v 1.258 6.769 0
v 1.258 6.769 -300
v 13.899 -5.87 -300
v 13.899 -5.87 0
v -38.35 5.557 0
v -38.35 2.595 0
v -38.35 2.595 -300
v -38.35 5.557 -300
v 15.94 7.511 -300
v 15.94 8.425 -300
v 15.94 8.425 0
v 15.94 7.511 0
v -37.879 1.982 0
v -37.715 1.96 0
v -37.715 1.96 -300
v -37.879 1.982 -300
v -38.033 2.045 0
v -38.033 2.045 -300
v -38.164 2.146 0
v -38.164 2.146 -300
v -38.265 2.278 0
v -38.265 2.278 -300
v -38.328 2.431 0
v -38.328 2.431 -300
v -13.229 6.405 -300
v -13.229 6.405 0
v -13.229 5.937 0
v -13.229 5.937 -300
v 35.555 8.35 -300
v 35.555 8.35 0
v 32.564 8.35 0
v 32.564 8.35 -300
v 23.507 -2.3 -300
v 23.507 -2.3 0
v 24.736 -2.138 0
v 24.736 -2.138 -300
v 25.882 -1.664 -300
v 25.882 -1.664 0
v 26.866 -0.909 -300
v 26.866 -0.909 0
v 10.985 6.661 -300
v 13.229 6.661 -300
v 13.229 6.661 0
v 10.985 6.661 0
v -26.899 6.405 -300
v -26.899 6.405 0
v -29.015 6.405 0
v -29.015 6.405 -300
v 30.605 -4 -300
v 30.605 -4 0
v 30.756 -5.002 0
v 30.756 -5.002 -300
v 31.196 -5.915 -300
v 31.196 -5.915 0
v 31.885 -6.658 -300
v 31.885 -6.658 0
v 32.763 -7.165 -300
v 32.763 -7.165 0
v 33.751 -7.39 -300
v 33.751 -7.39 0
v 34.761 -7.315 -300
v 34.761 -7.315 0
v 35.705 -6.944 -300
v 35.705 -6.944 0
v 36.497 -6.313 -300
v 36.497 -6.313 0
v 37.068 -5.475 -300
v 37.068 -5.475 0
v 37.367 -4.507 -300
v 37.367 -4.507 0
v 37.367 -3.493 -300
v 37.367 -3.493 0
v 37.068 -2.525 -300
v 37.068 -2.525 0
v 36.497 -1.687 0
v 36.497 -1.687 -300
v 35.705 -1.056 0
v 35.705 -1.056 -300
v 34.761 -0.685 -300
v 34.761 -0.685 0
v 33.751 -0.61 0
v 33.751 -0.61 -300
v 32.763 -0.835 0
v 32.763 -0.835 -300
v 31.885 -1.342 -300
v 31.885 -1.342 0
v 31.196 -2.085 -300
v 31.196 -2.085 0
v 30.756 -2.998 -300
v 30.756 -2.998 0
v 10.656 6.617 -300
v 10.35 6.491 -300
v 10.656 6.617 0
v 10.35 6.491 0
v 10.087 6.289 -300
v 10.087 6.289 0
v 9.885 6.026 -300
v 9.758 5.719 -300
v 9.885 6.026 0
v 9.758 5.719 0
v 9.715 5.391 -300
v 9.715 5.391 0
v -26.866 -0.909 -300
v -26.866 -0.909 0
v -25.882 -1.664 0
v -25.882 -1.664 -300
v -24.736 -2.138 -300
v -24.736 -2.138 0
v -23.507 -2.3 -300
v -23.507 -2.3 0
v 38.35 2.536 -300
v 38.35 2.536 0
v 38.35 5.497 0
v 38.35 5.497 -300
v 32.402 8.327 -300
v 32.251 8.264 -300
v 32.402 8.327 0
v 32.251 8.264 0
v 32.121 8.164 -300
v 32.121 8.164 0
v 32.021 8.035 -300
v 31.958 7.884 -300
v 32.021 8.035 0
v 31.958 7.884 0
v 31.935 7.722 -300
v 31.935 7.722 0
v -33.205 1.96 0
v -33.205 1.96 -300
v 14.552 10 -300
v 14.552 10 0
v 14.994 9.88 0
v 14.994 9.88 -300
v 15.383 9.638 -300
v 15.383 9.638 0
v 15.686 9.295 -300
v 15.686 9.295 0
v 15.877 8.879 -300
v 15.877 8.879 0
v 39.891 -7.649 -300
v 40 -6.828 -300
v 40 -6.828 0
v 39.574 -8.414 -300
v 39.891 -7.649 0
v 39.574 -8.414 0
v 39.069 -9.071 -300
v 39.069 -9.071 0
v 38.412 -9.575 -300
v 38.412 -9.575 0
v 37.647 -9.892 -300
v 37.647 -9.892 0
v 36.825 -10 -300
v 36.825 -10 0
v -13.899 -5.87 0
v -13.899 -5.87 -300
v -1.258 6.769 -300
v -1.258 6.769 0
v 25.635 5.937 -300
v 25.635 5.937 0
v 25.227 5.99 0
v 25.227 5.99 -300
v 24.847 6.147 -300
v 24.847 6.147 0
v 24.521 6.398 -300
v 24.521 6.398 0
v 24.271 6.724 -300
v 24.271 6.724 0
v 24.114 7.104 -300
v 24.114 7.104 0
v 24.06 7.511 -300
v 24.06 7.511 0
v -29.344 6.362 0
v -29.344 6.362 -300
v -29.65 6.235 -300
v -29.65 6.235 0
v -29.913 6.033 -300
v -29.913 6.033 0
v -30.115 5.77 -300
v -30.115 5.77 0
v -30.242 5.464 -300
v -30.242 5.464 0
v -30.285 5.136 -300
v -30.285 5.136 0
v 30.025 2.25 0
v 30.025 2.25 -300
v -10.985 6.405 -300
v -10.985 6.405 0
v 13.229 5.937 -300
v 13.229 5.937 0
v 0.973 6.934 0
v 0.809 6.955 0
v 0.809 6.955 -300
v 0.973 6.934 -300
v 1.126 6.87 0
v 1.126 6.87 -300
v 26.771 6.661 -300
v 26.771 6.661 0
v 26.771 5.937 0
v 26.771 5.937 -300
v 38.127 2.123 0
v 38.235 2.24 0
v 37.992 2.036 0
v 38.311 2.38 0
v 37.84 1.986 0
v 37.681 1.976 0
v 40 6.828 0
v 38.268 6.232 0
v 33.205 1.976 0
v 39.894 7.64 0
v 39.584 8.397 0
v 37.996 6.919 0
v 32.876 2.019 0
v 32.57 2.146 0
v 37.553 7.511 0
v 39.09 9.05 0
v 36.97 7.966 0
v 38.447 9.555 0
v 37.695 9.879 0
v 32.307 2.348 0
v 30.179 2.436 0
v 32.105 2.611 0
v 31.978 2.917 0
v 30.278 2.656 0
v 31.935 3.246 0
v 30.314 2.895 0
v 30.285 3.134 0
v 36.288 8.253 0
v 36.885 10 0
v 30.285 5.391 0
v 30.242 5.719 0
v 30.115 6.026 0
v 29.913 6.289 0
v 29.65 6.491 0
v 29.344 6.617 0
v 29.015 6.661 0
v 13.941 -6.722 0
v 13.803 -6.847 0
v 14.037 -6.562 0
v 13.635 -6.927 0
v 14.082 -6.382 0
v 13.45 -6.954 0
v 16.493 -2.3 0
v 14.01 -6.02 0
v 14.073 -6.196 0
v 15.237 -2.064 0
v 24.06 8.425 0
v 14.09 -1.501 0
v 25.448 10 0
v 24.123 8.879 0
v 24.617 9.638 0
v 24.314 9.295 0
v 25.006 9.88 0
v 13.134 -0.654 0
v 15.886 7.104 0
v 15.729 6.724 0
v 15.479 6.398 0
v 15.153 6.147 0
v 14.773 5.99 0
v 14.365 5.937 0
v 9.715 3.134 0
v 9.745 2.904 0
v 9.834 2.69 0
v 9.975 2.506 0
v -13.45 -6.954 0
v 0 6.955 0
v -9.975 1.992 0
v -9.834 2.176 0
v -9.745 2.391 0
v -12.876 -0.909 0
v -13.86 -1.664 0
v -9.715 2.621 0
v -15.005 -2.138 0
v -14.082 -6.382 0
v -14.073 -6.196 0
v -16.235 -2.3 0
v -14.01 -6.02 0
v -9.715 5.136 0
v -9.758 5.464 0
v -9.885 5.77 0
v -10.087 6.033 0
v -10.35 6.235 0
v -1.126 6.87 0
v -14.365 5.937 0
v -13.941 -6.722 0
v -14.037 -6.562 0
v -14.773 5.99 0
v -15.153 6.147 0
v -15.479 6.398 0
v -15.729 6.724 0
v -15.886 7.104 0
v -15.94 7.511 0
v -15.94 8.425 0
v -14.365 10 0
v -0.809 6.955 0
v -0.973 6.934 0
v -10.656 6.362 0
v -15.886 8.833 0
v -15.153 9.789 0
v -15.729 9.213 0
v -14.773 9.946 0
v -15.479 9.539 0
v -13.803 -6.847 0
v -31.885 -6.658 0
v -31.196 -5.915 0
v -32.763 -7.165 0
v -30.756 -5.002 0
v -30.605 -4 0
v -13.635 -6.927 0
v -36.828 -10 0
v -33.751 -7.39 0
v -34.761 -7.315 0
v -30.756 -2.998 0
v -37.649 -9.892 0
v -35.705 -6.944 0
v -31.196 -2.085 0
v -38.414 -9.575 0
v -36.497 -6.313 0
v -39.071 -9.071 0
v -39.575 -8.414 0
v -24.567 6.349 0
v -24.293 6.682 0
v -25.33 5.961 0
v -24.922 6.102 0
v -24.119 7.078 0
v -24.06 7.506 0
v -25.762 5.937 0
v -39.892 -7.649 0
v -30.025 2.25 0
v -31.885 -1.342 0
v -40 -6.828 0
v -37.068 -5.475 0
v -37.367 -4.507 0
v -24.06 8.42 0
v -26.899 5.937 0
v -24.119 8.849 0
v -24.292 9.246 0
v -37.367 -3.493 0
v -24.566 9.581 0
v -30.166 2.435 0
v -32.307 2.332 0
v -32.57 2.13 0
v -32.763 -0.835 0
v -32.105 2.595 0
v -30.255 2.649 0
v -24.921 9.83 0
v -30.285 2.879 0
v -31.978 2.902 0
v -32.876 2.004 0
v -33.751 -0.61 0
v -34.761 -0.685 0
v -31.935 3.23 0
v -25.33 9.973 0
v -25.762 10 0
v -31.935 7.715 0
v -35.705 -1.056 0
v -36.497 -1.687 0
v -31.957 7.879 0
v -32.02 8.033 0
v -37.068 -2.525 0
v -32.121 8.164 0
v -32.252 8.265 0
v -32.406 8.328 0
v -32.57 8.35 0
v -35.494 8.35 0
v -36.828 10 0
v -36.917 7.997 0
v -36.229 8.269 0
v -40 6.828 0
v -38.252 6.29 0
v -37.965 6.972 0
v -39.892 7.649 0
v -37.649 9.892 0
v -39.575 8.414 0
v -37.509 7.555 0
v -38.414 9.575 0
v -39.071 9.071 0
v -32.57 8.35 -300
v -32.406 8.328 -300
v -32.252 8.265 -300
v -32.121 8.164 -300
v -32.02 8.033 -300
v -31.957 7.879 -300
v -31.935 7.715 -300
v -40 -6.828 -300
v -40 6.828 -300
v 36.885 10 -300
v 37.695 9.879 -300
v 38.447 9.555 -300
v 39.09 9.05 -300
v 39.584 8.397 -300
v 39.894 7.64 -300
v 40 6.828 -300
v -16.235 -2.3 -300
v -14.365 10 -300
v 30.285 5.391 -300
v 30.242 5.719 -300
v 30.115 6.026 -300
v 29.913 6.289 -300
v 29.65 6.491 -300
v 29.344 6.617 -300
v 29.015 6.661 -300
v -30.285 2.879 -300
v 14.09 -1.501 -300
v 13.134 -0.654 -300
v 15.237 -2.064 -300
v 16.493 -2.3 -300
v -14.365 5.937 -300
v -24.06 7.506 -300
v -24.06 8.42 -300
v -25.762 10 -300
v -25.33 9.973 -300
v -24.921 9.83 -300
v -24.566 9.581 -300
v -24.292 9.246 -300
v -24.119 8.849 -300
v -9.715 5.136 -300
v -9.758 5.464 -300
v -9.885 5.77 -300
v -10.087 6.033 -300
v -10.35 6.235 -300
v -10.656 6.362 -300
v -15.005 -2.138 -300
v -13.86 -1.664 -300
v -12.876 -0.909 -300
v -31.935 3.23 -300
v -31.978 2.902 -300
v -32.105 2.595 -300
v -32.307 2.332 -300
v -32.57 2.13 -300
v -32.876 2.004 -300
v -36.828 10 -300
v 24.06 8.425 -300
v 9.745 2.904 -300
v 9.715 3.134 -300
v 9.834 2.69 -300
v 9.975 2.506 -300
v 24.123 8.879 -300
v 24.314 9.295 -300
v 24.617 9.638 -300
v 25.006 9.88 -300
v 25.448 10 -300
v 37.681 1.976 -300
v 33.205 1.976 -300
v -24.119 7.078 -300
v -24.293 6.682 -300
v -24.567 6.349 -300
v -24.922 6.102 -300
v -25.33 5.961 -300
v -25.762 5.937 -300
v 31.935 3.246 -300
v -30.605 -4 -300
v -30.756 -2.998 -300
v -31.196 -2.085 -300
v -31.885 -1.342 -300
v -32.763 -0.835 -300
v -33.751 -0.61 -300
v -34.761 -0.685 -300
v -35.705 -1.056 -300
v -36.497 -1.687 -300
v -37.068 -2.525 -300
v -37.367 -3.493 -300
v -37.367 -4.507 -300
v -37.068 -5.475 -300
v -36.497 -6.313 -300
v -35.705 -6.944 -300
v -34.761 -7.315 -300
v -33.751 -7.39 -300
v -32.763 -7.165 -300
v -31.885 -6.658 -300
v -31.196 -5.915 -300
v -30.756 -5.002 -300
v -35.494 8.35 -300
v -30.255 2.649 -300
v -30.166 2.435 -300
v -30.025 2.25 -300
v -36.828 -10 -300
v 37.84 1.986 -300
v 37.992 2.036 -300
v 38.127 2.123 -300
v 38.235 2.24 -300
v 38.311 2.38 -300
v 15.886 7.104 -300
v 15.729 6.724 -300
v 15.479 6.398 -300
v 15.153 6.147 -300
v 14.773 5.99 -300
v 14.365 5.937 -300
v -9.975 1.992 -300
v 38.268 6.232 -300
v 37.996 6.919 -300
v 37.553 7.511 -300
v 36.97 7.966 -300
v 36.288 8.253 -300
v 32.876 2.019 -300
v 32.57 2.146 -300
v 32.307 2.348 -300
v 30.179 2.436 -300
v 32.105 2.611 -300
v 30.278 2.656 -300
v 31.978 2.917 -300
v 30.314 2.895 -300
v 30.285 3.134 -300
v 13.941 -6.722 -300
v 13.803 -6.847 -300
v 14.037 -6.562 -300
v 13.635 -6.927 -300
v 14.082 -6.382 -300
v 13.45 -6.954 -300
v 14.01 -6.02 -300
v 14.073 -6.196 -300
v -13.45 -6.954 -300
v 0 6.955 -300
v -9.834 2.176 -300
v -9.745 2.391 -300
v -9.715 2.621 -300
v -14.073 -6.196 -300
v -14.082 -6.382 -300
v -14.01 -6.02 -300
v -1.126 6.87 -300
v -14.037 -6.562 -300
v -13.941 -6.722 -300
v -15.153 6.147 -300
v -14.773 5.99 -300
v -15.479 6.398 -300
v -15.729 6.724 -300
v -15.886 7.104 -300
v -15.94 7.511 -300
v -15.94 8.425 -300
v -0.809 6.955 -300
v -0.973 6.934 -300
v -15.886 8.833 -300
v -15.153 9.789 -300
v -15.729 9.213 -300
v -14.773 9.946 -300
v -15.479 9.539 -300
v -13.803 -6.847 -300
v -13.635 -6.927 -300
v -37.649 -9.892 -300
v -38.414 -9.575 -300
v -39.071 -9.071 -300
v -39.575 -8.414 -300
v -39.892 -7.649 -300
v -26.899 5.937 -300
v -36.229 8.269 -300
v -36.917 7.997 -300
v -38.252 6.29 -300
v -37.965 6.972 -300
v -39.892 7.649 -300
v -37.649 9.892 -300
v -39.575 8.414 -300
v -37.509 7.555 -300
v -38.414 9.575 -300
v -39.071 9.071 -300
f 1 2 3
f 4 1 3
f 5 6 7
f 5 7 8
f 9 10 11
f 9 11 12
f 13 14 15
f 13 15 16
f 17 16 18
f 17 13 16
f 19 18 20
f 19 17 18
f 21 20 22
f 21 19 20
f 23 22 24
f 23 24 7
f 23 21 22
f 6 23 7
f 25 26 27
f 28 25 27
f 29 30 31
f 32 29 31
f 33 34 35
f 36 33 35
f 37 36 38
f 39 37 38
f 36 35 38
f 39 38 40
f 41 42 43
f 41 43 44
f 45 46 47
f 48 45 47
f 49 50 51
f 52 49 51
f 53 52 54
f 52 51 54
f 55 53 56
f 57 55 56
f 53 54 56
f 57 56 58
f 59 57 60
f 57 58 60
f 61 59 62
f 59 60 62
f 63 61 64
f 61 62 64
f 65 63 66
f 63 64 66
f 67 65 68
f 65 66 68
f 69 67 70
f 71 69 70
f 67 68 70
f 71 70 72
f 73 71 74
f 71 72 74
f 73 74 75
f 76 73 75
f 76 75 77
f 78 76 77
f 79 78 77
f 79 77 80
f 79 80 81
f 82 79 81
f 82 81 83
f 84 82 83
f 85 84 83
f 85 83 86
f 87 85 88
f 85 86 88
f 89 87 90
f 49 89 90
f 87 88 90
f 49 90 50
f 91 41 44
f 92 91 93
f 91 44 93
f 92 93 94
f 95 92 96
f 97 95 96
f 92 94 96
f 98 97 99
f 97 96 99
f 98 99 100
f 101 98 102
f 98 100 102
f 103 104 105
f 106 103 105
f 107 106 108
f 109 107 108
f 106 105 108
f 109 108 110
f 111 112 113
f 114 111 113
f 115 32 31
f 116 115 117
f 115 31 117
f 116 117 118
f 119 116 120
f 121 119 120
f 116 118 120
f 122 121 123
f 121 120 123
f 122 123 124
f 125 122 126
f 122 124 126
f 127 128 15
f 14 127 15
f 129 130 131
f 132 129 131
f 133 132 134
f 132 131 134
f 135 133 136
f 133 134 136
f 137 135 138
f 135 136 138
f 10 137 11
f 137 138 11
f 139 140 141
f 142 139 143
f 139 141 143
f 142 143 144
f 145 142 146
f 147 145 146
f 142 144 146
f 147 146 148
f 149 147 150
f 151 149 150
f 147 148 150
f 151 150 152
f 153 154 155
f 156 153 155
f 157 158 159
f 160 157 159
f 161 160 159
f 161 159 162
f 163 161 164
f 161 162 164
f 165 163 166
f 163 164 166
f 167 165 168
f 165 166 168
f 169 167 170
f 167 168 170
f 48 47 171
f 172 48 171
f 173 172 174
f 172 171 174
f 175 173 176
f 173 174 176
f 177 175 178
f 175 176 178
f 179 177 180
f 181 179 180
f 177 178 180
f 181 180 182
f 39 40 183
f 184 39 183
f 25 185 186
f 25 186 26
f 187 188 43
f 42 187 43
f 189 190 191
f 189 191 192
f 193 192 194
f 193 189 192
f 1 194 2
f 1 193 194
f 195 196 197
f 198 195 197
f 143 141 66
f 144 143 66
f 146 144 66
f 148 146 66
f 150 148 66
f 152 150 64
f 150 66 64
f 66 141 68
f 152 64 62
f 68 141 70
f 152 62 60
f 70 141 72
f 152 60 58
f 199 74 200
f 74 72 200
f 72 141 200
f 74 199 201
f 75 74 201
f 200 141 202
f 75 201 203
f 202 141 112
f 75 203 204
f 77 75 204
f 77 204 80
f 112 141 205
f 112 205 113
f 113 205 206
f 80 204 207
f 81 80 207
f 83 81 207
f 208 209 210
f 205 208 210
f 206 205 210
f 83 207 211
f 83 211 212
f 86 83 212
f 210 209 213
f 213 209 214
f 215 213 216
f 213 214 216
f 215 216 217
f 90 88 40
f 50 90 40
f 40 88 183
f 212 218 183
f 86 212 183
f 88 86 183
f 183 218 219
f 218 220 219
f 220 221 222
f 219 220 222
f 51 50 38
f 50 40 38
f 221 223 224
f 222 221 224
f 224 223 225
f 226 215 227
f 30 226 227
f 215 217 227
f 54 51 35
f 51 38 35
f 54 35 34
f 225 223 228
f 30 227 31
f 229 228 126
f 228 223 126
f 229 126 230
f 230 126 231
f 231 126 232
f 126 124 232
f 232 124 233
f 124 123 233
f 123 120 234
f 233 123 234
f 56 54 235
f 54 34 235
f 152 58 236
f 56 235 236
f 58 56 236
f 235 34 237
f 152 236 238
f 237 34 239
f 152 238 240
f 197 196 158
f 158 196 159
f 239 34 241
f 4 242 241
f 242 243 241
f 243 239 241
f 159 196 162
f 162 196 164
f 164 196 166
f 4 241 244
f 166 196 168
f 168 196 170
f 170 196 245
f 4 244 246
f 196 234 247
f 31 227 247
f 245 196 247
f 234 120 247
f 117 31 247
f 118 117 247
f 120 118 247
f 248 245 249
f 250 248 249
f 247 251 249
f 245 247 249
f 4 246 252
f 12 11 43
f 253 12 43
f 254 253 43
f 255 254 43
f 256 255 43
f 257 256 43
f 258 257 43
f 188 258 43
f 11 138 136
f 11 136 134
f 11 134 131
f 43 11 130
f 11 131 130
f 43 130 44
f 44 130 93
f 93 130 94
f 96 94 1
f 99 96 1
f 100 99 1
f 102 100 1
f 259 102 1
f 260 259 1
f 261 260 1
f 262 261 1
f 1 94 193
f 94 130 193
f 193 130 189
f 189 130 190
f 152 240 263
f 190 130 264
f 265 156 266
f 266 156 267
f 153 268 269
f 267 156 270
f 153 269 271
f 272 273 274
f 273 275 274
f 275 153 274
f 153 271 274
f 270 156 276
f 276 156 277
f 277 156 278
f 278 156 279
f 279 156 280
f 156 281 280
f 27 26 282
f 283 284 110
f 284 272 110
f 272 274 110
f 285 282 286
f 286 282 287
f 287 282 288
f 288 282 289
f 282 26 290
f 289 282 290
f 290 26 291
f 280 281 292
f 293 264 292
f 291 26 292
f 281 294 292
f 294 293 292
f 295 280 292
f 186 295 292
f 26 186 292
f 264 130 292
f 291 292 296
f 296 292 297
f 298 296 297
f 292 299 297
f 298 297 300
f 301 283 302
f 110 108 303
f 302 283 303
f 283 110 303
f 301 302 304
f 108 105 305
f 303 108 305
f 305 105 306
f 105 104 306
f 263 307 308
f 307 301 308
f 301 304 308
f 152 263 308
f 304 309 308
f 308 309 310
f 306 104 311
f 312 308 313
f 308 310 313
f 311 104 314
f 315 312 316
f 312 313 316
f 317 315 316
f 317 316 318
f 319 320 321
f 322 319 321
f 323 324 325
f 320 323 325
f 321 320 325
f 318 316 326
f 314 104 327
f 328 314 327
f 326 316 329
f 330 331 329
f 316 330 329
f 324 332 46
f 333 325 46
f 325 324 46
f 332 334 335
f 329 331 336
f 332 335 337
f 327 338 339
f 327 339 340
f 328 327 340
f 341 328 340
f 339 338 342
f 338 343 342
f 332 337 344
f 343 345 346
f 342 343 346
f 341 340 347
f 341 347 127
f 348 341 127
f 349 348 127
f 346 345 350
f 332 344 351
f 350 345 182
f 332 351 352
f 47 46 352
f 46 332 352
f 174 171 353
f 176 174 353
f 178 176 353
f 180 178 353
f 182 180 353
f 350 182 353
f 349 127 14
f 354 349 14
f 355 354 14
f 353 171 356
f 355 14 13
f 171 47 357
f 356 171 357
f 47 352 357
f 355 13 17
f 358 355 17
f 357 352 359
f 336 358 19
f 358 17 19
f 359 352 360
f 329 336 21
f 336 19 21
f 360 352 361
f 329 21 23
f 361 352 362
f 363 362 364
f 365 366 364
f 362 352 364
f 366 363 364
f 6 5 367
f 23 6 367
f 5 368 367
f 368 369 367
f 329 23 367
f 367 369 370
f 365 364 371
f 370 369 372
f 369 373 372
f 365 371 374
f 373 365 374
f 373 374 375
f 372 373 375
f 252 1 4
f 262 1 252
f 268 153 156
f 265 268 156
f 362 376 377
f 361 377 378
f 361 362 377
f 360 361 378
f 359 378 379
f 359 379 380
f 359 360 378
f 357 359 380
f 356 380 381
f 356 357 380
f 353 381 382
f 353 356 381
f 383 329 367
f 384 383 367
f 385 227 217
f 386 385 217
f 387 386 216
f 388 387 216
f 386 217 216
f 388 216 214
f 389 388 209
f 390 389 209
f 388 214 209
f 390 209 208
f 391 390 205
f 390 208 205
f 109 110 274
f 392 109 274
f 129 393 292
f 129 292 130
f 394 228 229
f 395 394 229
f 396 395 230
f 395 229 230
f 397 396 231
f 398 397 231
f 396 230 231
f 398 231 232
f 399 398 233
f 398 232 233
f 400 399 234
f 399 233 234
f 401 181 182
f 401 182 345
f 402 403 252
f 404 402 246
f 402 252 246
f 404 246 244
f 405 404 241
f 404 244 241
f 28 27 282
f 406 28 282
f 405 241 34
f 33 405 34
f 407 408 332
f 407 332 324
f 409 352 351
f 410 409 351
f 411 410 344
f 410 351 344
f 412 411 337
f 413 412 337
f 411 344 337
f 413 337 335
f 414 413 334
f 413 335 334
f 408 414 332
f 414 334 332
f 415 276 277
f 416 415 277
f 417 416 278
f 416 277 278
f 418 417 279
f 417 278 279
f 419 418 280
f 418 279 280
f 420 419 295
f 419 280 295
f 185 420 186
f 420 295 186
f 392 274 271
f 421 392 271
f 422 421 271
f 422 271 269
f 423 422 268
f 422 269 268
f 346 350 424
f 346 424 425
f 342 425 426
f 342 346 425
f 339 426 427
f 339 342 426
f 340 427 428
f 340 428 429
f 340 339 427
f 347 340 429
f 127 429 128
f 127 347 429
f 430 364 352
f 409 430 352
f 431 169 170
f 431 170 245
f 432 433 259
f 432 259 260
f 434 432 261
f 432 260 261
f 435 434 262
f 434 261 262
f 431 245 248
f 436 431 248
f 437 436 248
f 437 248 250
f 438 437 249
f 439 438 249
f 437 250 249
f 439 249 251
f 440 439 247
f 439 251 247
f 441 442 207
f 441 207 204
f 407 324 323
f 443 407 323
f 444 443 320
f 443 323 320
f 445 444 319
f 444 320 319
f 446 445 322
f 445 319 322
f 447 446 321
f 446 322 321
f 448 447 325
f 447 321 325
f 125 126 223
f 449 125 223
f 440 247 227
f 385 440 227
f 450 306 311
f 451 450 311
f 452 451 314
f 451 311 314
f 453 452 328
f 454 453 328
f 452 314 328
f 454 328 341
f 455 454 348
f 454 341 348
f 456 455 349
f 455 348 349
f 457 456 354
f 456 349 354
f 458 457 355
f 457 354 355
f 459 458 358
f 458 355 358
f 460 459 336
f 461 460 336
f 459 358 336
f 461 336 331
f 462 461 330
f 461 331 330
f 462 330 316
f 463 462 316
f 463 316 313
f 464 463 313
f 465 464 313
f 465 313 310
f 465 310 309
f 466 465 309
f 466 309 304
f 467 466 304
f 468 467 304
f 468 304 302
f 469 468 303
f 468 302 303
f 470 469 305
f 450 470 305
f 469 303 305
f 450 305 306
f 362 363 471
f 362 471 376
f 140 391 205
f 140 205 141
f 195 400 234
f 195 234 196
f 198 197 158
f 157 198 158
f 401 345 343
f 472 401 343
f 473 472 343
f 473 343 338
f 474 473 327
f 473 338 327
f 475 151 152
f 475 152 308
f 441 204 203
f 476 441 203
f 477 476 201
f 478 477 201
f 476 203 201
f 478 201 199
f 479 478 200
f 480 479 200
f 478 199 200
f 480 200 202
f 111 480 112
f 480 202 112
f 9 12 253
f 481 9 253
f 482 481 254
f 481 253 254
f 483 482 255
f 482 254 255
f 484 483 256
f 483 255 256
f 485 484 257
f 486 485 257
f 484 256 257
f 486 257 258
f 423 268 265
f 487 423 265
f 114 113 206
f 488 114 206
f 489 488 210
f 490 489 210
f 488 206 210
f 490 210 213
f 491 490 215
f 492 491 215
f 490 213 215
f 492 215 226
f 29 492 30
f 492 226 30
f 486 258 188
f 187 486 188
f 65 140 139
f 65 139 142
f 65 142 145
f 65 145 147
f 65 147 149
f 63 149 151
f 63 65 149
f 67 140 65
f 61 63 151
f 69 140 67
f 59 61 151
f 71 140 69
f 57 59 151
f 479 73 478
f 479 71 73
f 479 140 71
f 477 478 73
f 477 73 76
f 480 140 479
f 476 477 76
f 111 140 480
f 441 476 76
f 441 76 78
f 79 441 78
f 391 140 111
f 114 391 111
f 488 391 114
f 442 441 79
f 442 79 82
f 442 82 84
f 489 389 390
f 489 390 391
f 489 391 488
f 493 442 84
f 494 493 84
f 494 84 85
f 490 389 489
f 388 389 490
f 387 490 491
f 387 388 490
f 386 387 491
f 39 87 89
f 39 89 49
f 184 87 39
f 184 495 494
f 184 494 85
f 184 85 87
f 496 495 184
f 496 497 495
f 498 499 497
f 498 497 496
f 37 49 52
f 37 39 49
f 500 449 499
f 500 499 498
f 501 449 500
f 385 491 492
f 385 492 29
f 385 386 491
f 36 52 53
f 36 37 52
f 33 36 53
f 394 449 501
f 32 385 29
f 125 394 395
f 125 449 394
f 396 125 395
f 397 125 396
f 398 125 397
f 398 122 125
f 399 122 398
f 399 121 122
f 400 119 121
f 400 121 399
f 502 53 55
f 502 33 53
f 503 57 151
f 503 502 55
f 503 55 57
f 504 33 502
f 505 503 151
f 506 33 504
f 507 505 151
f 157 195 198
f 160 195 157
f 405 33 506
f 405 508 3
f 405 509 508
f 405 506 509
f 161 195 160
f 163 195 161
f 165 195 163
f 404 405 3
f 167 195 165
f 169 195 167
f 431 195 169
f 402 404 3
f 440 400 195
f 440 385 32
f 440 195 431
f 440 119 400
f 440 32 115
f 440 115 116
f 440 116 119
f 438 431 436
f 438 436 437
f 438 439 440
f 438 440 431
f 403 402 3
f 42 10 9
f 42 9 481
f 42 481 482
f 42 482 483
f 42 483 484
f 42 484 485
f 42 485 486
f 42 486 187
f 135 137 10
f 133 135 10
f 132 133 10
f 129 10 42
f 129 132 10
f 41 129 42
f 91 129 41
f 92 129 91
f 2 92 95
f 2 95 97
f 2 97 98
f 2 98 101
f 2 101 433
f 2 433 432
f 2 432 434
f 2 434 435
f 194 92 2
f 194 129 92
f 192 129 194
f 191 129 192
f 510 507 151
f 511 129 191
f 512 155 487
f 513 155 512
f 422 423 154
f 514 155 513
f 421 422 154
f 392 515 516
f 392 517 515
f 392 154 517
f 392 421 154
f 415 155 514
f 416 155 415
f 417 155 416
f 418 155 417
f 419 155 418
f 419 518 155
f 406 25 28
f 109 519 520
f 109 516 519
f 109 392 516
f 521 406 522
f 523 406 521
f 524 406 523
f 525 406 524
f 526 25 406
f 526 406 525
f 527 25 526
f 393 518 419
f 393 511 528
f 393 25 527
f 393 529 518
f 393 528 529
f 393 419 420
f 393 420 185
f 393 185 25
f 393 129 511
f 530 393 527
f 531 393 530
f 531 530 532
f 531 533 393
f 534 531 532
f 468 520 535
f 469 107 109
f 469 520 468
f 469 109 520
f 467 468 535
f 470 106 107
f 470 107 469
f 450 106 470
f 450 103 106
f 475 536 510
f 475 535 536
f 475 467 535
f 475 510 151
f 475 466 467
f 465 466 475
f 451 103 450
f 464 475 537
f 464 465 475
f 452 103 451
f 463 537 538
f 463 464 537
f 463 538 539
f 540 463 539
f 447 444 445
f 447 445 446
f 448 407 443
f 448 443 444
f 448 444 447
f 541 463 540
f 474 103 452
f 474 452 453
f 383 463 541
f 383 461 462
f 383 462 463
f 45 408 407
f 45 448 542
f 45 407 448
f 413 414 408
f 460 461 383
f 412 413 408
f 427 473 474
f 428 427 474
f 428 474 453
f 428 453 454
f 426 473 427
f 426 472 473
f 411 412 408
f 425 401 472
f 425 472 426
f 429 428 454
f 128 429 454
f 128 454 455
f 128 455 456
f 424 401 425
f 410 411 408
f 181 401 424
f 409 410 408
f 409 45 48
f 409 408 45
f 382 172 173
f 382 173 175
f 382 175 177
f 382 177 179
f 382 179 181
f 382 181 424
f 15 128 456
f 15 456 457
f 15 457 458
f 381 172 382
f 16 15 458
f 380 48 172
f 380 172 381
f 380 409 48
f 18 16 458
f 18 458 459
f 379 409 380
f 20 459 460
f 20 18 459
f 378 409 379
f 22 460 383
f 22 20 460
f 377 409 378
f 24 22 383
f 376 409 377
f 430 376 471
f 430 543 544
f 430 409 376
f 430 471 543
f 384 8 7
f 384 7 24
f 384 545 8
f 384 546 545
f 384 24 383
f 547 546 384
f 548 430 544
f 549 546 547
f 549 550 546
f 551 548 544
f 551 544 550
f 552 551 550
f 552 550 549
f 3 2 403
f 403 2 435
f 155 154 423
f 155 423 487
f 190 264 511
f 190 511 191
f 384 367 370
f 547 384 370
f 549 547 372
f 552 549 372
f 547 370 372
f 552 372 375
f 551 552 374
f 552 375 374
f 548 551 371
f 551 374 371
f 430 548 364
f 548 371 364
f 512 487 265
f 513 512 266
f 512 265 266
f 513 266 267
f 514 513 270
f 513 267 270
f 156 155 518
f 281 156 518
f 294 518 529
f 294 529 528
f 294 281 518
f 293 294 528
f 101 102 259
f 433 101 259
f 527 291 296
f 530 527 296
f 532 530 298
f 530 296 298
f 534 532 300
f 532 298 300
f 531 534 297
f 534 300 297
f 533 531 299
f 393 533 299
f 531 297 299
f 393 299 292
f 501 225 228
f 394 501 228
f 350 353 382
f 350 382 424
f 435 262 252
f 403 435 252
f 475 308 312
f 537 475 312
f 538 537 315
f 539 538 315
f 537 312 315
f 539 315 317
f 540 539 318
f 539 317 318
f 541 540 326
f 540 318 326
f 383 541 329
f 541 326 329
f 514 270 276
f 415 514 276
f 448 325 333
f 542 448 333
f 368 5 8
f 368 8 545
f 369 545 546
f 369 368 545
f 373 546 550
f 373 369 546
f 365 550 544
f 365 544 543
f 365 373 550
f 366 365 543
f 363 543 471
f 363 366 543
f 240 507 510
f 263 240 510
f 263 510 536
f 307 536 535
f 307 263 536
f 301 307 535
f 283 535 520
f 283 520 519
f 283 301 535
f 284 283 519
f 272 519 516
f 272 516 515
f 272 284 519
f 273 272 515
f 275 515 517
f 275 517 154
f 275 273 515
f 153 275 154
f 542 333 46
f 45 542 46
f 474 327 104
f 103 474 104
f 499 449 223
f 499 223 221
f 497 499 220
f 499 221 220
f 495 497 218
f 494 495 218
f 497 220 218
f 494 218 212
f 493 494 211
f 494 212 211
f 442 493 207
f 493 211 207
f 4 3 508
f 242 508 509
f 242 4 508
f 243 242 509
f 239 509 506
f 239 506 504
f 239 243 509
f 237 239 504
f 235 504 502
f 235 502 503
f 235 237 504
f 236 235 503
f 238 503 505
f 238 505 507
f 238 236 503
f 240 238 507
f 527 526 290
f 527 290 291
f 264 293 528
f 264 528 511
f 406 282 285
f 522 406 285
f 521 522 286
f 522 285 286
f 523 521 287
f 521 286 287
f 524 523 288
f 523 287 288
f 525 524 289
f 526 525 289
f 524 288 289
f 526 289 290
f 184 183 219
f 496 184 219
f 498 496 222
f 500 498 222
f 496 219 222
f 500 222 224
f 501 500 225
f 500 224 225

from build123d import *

# Parameters (mm, degrees)
SKETCH1_R      = 3.4
SKETCH1_R_2    = 3.400000006
EXTRUDE1_DEPTH = 300


with BuildPart() as part:
    # Sketch1 → Extrude1 (new body)
    with BuildSketch(Plane.XY):
        with BuildLine():
            Line((-36.828217803, 10), (-25.761678346, 10))
            ThreePointArc((-25.761678346, 10), (-24.566343162, 9.581217839), (-24.06, 8.420260776))
            Line((-24.06, 8.420260776), (-24.06, 7.505975062))
            ThreePointArc((-24.06, 7.505975062), (-24.567063435, 6.348506245), (-25.761678346, 5.936507937))
            Line((-25.761678346, 5.936507937), (-26.89856374, 5.936507937))
            Line((-26.89856374, 5.936507937), (-26.89856374, 6.405354551))
            Line((-26.89856374, 6.405354551), (-29.01515873, 6.405354551))
            ThreePointArc((-29.01515873, 6.405354551), (-29.913072103, 6.033426654), (-30.285, 5.135513281))
            Line((-30.285, 5.135513281), (-30.285, 2.878955078))
            ThreePointArc((-30.285, 2.878955078), (-30.217342047, 2.538803338), (-30.024667785, 2.250433031))
            Line((-30.024667785, 2.250433031), (-26.865511635, -0.908897163))
            ThreePointArc((-26.865511635, -0.908897163), (-25.324726136, -1.938463161), (-23.50722312, -2.3))
            Line((-23.50722312, -2.3), (-16.234679932, -2.3))
            ThreePointArc((-16.234679932, -2.3), (-14.417176915, -1.938463161), (-12.876391416, -0.908897163))
            Line((-12.876391416, -0.908897163), (-9.975332215, 1.992321863))
            ThreePointArc((-9.975332215, 1.992321863), (-9.782657953, 2.28069217), (-9.715, 2.620843911))
            Line((-9.715, 2.620843911), (-9.715, 5.135513281))
            ThreePointArc((-9.715, 5.135513281), (-10.086927897, 6.033426654), (-10.98484127, 6.405354551))
            Line((-10.98484127, 6.405354551), (-13.228511431, 6.405354551))
            Line((-13.228511431, 6.405354551), (-13.228511431, 5.936507937))
            Line((-13.228511431, 5.936507937), (-14.365396825, 5.936507937))
            ThreePointArc((-14.365396825, 5.936507937), (-15.478809408, 6.397698529), (-15.94, 7.511111111))
            Line((-15.94, 7.511111111), (-15.94, 8.425396825))
            ThreePointArc((-15.94, 8.425396825), (-15.478809408, 9.538809408), (-14.365396825, 10))
            Line((-14.365396825, 10), (-7.044126982, 10))
            Line((-7.044126982, 10), (14.552471996, 10))
            ThreePointArc((14.552471996, 10), (15.546813416, 9.477564883), (15.94, 8.425396825))
            Line((15.94, 8.425396825), (15.94, 7.511111111))
            ThreePointArc((15.94, 7.511111111), (15.478809408, 6.397698529), (14.365396825, 5.936507937))
            Line((14.365396825, 5.936507937), (13.228511431, 5.936507937))
            Line((13.228511431, 5.936507937), (13.228511431, 6.660633301))
            Line((13.228511431, 6.660633301), (10.98484127, 6.660633301))
            ThreePointArc((10.98484127, 6.660633301), (10.086927897, 6.288705404), (9.715, 5.390792031))
            Line((9.715, 5.390792031), (9.715, 3.134233829))
            ThreePointArc((9.715, 3.134233829), (9.782657953, 2.794082088), (9.975332215, 2.505711781))
            Line((9.975332215, 2.505711781), (13.134488365, -0.653618412))
            ThreePointArc((13.134488365, -0.653618412), (14.64473832, -1.821319739), (16.49277688, -2.3))
            Line((16.49277688, -2.3), (23.50722312, -2.3))
            ThreePointArc((23.50722312, -2.3), (25.324726136, -1.938463161), (26.865511635, -0.908897163))
            Line((26.865511635, -0.908897163), (30.024667785, 2.250433031))
            ThreePointArc((30.024667785, 2.250433031), (30.278278636, 2.655971567), (30.285, 3.134233829))
            Line((30.285, 3.134233829), (30.285, 5.390792031))
            ThreePointArc((30.285, 5.390792031), (29.913072103, 6.288705404), (29.01515873, 6.660633301))
            Line((29.01515873, 6.660633301), (26.771488569, 6.660633301))
            Line((26.771488569, 6.660633301), (26.771488569, 5.936507937))
            Line((26.771488569, 5.936507937), (25.634603175, 5.936507937))
            ThreePointArc((25.634603175, 5.936507937), (24.521190592, 6.397698529), (24.06, 7.511111111))
            Line((24.06, 7.511111111), (24.06, 8.425396825))
            ThreePointArc((24.06, 8.425396825), (24.453186584, 9.477564883), (25.447528004, 10))
            Line((25.447528004, 10), (33.075833554, 10))
            Line((33.075833554, 10), (36.885357363, 10))
            ThreePointArc((36.885357363, 10), (39.090491138, 9.050251023), (40, 6.828217785))
            Line((40, 6.828217785), (40, -6.828217785))
            ThreePointArc((40, -6.828217785), (39.069183486, -9.071177839), (36.825396825, -10))
            Line((36.825396825, -10), (-36.828217803, -10))
            ThreePointArc((-36.828217803, -10), (-39.071006503, -9.071006503), (-40, -6.828217803))
            Line((-40, -6.828217803), (-40, 6.828217803))
            ThreePointArc((-40, 6.828217803), (-39.071006503, 9.071006503), (-36.828217803, 10))
        make_face()
        with Locations((-34.004773868, -4)):
            Circle(SKETCH1_R, mode=Mode.SUBTRACT)
        with Locations(Location((34.004773868, -4, 0), (0, 0, 180))):
            Circle(SKETCH1_R_2, mode=Mode.SUBTRACT)
        with BuildLine():
            Line((-38.35, 2.595292927), (-38.35, 5.557055178))
            ThreePointArc((-38.35, 5.557055178), (-37.509428882, 7.554544736), (-35.493548116, 8.35))
            Line((-35.493548116, 8.35), (-32.569919859, 8.35))
            ThreePointArc((-32.569919859, 8.35), (-32.120963721, 8.164036279), (-31.935, 7.715080141))
            Line((-31.935, 7.715080141), (-31.935, 3.230213422))
            ThreePointArc((-31.935, 3.230213422), (-32.306927856, 2.332300148), (-33.20484113, 1.960372292))
            Line((-33.20484113, 1.960372292), (-37.715079365, 1.960372292))
            ThreePointArc((-37.715079365, 1.960372292), (-38.164036052, 2.14633624), (-38.35, 2.595292927))
        make_face(mode=Mode.SUBTRACT)
        with BuildLine():
            Line((13.450195503, -6.954394873), (-13.450195503, -6.954394873))
            ThreePointArc((-13.450195503, -6.954394873), (-14.036762187, -6.562412722), (-13.89908728, -5.870490687))
            Line((-13.89908728, -5.870490687), (-1.257767926, 6.769315833))
            ThreePointArc((-1.257767926, 6.769315833), (-1.051776589, 6.906937009), (-0.808800063, 6.955252915))
            Line((-0.808800063, 6.955252915), (0, 6.955204454))
            Line((0, 6.955204454), (0.808800063, 6.955252915))
            ThreePointArc((0.808800063, 6.955252915), (1.051776589, 6.906937009), (1.257767926, 6.769315833))
            Line((1.257767926, 6.769315833), (13.89908728, -5.870490687))
            ThreePointArc((13.89908728, -5.870490687), (14.036762187, -6.562412722), (13.450195503, -6.954394873))
        make_face(mode=Mode.SUBTRACT)
        with BuildLine():
            Line((35.554894965, 8.35), (32.563967874, 8.35))
            ThreePointArc((32.563967874, 8.35), (32.121226634, 8.164362109), (31.935, 7.721868186))
            Line((31.935, 7.721868186), (31.935, 3.245873842))
            ThreePointArc((31.935, 3.245873842), (32.306927897, 2.347960469), (33.20484127, 1.976032573))
            Line((33.20484127, 1.976032573), (37.680832198, 1.976032573))
            ThreePointArc((37.680832198, 1.976032573), (38.126707117, 2.122693703), (38.35, 2.535554718))
            Line((38.35, 2.535554718), (38.35, 5.496770698))
            ThreePointArc((38.35, 5.496770698), (37.552616332, 7.511327921), (35.554894965, 8.35))
        make_face(mode=Mode.SUBTRACT)
    extrude(amount=-EXTRUDE1_DEPTH)


solid = part.part
